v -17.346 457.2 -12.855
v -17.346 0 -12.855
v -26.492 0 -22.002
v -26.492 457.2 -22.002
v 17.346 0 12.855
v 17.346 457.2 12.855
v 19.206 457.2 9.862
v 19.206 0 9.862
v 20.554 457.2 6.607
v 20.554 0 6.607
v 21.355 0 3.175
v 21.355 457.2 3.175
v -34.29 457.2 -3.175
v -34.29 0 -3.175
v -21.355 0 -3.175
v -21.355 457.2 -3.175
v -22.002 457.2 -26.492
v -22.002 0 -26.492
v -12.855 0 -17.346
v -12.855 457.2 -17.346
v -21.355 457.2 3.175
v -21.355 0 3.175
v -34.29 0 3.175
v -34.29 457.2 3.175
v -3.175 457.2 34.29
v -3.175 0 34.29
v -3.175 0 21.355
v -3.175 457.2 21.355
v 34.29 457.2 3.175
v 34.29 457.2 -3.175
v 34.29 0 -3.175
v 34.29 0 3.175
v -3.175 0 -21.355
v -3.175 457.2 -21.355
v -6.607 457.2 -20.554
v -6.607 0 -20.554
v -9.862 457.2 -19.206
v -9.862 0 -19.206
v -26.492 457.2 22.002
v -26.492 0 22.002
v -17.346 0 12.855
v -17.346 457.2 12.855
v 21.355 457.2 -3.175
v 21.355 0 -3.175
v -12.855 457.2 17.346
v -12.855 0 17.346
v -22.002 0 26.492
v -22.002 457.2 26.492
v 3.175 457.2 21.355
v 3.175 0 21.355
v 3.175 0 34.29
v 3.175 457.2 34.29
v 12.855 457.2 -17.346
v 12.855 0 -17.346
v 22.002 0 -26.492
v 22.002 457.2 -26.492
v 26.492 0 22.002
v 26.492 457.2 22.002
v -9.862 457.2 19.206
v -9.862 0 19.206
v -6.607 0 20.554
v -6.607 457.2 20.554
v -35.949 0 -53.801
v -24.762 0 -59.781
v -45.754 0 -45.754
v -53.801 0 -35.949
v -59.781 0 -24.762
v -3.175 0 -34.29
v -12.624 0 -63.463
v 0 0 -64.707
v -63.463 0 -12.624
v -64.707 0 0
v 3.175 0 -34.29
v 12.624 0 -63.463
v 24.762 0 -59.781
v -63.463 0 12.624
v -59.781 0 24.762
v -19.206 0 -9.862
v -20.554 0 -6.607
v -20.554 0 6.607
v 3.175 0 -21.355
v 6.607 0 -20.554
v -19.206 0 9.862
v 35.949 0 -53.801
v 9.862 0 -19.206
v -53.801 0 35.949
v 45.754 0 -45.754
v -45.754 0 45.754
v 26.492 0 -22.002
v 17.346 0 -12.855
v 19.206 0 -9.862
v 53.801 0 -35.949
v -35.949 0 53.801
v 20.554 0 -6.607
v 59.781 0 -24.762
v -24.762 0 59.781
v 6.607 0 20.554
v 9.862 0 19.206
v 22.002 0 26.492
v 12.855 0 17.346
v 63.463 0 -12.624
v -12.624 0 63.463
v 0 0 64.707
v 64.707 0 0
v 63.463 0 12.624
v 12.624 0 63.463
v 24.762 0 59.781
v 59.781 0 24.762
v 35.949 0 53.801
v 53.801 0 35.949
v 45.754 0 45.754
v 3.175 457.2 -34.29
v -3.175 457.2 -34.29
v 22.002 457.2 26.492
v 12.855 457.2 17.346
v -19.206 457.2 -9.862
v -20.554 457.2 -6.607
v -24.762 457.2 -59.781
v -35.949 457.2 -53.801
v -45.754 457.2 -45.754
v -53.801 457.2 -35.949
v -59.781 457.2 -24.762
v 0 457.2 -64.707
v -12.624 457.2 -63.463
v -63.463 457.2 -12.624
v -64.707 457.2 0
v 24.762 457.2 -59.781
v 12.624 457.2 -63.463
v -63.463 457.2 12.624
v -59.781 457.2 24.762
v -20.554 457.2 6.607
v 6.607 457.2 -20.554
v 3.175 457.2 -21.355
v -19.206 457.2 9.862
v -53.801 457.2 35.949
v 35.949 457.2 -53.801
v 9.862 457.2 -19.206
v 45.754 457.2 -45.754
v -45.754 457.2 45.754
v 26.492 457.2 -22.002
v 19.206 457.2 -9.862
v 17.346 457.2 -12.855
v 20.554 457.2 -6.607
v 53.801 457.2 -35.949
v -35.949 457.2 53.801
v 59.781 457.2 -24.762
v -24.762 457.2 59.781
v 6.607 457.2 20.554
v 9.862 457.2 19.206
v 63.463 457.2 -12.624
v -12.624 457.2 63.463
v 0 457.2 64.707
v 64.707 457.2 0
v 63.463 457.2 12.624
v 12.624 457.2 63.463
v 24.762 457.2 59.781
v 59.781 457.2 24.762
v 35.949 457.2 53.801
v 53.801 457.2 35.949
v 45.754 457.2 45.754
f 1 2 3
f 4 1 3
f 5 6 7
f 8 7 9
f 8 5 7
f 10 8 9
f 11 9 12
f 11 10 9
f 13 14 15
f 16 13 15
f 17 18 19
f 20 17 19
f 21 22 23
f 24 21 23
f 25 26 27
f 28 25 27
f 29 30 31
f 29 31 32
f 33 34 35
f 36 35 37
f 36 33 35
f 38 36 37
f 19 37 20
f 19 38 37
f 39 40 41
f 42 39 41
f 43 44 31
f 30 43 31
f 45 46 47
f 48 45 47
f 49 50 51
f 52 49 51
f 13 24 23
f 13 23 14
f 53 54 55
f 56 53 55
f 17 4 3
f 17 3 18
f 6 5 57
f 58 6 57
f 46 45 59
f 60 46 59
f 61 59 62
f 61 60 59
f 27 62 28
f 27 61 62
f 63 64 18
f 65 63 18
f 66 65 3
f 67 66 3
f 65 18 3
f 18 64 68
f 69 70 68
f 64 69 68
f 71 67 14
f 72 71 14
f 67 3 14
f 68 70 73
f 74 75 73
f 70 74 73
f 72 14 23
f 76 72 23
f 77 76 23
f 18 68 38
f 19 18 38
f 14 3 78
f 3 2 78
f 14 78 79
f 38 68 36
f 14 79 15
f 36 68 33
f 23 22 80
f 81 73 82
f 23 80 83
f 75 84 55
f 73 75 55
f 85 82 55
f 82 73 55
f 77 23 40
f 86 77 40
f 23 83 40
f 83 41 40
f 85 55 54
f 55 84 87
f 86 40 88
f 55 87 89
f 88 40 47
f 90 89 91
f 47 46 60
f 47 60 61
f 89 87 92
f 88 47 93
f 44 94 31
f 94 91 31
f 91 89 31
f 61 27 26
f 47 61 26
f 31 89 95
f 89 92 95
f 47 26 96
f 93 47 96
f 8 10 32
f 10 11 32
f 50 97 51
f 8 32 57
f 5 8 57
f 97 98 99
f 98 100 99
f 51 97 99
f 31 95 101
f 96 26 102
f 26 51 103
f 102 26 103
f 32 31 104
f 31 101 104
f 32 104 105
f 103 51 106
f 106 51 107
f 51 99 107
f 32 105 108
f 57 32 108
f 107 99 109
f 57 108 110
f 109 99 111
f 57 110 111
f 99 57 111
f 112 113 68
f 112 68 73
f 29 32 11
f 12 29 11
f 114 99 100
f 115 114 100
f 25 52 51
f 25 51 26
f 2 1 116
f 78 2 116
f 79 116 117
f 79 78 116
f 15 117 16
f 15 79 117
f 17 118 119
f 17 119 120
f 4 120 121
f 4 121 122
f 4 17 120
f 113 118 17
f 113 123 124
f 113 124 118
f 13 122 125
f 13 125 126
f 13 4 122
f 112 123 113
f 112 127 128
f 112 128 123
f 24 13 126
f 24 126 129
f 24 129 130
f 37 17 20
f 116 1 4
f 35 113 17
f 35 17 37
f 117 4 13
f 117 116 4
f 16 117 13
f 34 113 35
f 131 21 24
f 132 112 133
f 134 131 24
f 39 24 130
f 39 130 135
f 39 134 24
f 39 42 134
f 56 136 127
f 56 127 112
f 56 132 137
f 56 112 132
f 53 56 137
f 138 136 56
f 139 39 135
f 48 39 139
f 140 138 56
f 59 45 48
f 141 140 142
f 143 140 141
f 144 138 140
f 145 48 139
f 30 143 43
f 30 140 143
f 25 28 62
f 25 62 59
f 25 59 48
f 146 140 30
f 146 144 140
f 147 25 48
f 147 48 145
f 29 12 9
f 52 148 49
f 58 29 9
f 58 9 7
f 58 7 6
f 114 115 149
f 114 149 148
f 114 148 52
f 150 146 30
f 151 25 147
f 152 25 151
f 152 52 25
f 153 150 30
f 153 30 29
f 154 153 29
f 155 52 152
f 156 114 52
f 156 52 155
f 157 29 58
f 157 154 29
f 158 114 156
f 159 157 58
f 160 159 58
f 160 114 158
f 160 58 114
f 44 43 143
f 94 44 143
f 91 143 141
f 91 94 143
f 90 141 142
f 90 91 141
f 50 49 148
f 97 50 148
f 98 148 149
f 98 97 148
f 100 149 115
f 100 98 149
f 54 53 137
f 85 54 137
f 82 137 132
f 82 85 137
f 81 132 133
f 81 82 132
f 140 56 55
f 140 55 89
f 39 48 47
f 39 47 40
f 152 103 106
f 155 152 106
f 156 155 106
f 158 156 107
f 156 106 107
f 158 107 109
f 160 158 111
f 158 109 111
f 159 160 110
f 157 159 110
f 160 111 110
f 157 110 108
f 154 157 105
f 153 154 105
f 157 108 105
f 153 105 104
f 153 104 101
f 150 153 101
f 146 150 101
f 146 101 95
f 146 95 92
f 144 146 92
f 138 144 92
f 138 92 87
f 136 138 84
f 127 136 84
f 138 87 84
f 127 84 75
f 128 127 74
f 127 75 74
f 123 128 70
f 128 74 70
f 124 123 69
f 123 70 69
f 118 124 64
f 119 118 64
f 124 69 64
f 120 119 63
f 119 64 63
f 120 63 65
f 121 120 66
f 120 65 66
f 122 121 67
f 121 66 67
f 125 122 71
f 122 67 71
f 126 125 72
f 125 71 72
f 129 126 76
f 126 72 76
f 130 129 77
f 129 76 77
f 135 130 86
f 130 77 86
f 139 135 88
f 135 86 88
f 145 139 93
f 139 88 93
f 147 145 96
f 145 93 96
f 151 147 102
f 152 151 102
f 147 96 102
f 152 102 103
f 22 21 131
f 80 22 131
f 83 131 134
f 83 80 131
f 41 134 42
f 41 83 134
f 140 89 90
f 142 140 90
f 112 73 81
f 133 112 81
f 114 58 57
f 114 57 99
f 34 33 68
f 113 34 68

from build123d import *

# Parameters (mm, degrees)
SKETCH1_R           = 64.7065
SKETCH1_R_2         = 21.59
BOSS_EXTRUDE1_DEPTH = 457.2
CUT_EXTRUDE1_REACH  = 468.268
CIRPATTERN1_COUNT   = 8


with BuildPart() as part:
    # Sketch1 → Boss-Extrude1 (new body)
    with BuildSketch(Plane(origin=(0, 0, 0), x_dir=(1, 0, 0), z_dir=(0, 1, 0))):
        with Locations(Location((0, 0, 0), (0, 0, 270))):
            Circle(SKETCH1_R)
        with Locations(Location((0, 0, 0), (0, 0, 270))):
            Circle(SKETCH1_R_2, mode=Mode.SUBTRACT)
    extrude(amount=BOSS_EXTRUDE1_DEPTH)

    # Sketch2 → Cut-Extrude1 (cut, up to next)
    with BuildSketch(Plane(origin=(0, 457.2, 0), x_dir=(1, 0, 0), z_dir=(0, 1, 0)), mode=Mode.PRIVATE) as cut_extrude1_sk1:
        with BuildLine():
            Line((-3.175, 34.29), (3.175, 34.29))
            Line((3.175, 34.29), (3.175, 21.355268085))
            ThreePointArc((3.175, 21.355268085), (0, 21.59), (-3.175, 21.355268085))
            Line((-3.175, 21.355268085), (-3.175, 34.29))
        make_face()
    cut_extrude1_tool1 = extrude(cut_extrude1_sk1.sketch, amount=-CUT_EXTRUDE1_REACH, mode=Mode.PRIVATE) & part.part
    cut_extrude1 = cut_extrude1_tool1.solids().sort_by_distance((0, 457.2, -27.900772))[0]
    add(cut_extrude1, mode=Mode.SUBTRACT)

    # CirPattern1: Cut-Extrude1 ×8 about axis
    cirpattern1_axis = Axis((0, 0, 0), (0, 1, 0))
    for i in range(1, CIRPATTERN1_COUNT):
        add(cut_extrude1.rotate(cirpattern1_axis, i * 360 / CIRPATTERN1_COUNT), mode=Mode.SUBTRACT)


solid = part.part
